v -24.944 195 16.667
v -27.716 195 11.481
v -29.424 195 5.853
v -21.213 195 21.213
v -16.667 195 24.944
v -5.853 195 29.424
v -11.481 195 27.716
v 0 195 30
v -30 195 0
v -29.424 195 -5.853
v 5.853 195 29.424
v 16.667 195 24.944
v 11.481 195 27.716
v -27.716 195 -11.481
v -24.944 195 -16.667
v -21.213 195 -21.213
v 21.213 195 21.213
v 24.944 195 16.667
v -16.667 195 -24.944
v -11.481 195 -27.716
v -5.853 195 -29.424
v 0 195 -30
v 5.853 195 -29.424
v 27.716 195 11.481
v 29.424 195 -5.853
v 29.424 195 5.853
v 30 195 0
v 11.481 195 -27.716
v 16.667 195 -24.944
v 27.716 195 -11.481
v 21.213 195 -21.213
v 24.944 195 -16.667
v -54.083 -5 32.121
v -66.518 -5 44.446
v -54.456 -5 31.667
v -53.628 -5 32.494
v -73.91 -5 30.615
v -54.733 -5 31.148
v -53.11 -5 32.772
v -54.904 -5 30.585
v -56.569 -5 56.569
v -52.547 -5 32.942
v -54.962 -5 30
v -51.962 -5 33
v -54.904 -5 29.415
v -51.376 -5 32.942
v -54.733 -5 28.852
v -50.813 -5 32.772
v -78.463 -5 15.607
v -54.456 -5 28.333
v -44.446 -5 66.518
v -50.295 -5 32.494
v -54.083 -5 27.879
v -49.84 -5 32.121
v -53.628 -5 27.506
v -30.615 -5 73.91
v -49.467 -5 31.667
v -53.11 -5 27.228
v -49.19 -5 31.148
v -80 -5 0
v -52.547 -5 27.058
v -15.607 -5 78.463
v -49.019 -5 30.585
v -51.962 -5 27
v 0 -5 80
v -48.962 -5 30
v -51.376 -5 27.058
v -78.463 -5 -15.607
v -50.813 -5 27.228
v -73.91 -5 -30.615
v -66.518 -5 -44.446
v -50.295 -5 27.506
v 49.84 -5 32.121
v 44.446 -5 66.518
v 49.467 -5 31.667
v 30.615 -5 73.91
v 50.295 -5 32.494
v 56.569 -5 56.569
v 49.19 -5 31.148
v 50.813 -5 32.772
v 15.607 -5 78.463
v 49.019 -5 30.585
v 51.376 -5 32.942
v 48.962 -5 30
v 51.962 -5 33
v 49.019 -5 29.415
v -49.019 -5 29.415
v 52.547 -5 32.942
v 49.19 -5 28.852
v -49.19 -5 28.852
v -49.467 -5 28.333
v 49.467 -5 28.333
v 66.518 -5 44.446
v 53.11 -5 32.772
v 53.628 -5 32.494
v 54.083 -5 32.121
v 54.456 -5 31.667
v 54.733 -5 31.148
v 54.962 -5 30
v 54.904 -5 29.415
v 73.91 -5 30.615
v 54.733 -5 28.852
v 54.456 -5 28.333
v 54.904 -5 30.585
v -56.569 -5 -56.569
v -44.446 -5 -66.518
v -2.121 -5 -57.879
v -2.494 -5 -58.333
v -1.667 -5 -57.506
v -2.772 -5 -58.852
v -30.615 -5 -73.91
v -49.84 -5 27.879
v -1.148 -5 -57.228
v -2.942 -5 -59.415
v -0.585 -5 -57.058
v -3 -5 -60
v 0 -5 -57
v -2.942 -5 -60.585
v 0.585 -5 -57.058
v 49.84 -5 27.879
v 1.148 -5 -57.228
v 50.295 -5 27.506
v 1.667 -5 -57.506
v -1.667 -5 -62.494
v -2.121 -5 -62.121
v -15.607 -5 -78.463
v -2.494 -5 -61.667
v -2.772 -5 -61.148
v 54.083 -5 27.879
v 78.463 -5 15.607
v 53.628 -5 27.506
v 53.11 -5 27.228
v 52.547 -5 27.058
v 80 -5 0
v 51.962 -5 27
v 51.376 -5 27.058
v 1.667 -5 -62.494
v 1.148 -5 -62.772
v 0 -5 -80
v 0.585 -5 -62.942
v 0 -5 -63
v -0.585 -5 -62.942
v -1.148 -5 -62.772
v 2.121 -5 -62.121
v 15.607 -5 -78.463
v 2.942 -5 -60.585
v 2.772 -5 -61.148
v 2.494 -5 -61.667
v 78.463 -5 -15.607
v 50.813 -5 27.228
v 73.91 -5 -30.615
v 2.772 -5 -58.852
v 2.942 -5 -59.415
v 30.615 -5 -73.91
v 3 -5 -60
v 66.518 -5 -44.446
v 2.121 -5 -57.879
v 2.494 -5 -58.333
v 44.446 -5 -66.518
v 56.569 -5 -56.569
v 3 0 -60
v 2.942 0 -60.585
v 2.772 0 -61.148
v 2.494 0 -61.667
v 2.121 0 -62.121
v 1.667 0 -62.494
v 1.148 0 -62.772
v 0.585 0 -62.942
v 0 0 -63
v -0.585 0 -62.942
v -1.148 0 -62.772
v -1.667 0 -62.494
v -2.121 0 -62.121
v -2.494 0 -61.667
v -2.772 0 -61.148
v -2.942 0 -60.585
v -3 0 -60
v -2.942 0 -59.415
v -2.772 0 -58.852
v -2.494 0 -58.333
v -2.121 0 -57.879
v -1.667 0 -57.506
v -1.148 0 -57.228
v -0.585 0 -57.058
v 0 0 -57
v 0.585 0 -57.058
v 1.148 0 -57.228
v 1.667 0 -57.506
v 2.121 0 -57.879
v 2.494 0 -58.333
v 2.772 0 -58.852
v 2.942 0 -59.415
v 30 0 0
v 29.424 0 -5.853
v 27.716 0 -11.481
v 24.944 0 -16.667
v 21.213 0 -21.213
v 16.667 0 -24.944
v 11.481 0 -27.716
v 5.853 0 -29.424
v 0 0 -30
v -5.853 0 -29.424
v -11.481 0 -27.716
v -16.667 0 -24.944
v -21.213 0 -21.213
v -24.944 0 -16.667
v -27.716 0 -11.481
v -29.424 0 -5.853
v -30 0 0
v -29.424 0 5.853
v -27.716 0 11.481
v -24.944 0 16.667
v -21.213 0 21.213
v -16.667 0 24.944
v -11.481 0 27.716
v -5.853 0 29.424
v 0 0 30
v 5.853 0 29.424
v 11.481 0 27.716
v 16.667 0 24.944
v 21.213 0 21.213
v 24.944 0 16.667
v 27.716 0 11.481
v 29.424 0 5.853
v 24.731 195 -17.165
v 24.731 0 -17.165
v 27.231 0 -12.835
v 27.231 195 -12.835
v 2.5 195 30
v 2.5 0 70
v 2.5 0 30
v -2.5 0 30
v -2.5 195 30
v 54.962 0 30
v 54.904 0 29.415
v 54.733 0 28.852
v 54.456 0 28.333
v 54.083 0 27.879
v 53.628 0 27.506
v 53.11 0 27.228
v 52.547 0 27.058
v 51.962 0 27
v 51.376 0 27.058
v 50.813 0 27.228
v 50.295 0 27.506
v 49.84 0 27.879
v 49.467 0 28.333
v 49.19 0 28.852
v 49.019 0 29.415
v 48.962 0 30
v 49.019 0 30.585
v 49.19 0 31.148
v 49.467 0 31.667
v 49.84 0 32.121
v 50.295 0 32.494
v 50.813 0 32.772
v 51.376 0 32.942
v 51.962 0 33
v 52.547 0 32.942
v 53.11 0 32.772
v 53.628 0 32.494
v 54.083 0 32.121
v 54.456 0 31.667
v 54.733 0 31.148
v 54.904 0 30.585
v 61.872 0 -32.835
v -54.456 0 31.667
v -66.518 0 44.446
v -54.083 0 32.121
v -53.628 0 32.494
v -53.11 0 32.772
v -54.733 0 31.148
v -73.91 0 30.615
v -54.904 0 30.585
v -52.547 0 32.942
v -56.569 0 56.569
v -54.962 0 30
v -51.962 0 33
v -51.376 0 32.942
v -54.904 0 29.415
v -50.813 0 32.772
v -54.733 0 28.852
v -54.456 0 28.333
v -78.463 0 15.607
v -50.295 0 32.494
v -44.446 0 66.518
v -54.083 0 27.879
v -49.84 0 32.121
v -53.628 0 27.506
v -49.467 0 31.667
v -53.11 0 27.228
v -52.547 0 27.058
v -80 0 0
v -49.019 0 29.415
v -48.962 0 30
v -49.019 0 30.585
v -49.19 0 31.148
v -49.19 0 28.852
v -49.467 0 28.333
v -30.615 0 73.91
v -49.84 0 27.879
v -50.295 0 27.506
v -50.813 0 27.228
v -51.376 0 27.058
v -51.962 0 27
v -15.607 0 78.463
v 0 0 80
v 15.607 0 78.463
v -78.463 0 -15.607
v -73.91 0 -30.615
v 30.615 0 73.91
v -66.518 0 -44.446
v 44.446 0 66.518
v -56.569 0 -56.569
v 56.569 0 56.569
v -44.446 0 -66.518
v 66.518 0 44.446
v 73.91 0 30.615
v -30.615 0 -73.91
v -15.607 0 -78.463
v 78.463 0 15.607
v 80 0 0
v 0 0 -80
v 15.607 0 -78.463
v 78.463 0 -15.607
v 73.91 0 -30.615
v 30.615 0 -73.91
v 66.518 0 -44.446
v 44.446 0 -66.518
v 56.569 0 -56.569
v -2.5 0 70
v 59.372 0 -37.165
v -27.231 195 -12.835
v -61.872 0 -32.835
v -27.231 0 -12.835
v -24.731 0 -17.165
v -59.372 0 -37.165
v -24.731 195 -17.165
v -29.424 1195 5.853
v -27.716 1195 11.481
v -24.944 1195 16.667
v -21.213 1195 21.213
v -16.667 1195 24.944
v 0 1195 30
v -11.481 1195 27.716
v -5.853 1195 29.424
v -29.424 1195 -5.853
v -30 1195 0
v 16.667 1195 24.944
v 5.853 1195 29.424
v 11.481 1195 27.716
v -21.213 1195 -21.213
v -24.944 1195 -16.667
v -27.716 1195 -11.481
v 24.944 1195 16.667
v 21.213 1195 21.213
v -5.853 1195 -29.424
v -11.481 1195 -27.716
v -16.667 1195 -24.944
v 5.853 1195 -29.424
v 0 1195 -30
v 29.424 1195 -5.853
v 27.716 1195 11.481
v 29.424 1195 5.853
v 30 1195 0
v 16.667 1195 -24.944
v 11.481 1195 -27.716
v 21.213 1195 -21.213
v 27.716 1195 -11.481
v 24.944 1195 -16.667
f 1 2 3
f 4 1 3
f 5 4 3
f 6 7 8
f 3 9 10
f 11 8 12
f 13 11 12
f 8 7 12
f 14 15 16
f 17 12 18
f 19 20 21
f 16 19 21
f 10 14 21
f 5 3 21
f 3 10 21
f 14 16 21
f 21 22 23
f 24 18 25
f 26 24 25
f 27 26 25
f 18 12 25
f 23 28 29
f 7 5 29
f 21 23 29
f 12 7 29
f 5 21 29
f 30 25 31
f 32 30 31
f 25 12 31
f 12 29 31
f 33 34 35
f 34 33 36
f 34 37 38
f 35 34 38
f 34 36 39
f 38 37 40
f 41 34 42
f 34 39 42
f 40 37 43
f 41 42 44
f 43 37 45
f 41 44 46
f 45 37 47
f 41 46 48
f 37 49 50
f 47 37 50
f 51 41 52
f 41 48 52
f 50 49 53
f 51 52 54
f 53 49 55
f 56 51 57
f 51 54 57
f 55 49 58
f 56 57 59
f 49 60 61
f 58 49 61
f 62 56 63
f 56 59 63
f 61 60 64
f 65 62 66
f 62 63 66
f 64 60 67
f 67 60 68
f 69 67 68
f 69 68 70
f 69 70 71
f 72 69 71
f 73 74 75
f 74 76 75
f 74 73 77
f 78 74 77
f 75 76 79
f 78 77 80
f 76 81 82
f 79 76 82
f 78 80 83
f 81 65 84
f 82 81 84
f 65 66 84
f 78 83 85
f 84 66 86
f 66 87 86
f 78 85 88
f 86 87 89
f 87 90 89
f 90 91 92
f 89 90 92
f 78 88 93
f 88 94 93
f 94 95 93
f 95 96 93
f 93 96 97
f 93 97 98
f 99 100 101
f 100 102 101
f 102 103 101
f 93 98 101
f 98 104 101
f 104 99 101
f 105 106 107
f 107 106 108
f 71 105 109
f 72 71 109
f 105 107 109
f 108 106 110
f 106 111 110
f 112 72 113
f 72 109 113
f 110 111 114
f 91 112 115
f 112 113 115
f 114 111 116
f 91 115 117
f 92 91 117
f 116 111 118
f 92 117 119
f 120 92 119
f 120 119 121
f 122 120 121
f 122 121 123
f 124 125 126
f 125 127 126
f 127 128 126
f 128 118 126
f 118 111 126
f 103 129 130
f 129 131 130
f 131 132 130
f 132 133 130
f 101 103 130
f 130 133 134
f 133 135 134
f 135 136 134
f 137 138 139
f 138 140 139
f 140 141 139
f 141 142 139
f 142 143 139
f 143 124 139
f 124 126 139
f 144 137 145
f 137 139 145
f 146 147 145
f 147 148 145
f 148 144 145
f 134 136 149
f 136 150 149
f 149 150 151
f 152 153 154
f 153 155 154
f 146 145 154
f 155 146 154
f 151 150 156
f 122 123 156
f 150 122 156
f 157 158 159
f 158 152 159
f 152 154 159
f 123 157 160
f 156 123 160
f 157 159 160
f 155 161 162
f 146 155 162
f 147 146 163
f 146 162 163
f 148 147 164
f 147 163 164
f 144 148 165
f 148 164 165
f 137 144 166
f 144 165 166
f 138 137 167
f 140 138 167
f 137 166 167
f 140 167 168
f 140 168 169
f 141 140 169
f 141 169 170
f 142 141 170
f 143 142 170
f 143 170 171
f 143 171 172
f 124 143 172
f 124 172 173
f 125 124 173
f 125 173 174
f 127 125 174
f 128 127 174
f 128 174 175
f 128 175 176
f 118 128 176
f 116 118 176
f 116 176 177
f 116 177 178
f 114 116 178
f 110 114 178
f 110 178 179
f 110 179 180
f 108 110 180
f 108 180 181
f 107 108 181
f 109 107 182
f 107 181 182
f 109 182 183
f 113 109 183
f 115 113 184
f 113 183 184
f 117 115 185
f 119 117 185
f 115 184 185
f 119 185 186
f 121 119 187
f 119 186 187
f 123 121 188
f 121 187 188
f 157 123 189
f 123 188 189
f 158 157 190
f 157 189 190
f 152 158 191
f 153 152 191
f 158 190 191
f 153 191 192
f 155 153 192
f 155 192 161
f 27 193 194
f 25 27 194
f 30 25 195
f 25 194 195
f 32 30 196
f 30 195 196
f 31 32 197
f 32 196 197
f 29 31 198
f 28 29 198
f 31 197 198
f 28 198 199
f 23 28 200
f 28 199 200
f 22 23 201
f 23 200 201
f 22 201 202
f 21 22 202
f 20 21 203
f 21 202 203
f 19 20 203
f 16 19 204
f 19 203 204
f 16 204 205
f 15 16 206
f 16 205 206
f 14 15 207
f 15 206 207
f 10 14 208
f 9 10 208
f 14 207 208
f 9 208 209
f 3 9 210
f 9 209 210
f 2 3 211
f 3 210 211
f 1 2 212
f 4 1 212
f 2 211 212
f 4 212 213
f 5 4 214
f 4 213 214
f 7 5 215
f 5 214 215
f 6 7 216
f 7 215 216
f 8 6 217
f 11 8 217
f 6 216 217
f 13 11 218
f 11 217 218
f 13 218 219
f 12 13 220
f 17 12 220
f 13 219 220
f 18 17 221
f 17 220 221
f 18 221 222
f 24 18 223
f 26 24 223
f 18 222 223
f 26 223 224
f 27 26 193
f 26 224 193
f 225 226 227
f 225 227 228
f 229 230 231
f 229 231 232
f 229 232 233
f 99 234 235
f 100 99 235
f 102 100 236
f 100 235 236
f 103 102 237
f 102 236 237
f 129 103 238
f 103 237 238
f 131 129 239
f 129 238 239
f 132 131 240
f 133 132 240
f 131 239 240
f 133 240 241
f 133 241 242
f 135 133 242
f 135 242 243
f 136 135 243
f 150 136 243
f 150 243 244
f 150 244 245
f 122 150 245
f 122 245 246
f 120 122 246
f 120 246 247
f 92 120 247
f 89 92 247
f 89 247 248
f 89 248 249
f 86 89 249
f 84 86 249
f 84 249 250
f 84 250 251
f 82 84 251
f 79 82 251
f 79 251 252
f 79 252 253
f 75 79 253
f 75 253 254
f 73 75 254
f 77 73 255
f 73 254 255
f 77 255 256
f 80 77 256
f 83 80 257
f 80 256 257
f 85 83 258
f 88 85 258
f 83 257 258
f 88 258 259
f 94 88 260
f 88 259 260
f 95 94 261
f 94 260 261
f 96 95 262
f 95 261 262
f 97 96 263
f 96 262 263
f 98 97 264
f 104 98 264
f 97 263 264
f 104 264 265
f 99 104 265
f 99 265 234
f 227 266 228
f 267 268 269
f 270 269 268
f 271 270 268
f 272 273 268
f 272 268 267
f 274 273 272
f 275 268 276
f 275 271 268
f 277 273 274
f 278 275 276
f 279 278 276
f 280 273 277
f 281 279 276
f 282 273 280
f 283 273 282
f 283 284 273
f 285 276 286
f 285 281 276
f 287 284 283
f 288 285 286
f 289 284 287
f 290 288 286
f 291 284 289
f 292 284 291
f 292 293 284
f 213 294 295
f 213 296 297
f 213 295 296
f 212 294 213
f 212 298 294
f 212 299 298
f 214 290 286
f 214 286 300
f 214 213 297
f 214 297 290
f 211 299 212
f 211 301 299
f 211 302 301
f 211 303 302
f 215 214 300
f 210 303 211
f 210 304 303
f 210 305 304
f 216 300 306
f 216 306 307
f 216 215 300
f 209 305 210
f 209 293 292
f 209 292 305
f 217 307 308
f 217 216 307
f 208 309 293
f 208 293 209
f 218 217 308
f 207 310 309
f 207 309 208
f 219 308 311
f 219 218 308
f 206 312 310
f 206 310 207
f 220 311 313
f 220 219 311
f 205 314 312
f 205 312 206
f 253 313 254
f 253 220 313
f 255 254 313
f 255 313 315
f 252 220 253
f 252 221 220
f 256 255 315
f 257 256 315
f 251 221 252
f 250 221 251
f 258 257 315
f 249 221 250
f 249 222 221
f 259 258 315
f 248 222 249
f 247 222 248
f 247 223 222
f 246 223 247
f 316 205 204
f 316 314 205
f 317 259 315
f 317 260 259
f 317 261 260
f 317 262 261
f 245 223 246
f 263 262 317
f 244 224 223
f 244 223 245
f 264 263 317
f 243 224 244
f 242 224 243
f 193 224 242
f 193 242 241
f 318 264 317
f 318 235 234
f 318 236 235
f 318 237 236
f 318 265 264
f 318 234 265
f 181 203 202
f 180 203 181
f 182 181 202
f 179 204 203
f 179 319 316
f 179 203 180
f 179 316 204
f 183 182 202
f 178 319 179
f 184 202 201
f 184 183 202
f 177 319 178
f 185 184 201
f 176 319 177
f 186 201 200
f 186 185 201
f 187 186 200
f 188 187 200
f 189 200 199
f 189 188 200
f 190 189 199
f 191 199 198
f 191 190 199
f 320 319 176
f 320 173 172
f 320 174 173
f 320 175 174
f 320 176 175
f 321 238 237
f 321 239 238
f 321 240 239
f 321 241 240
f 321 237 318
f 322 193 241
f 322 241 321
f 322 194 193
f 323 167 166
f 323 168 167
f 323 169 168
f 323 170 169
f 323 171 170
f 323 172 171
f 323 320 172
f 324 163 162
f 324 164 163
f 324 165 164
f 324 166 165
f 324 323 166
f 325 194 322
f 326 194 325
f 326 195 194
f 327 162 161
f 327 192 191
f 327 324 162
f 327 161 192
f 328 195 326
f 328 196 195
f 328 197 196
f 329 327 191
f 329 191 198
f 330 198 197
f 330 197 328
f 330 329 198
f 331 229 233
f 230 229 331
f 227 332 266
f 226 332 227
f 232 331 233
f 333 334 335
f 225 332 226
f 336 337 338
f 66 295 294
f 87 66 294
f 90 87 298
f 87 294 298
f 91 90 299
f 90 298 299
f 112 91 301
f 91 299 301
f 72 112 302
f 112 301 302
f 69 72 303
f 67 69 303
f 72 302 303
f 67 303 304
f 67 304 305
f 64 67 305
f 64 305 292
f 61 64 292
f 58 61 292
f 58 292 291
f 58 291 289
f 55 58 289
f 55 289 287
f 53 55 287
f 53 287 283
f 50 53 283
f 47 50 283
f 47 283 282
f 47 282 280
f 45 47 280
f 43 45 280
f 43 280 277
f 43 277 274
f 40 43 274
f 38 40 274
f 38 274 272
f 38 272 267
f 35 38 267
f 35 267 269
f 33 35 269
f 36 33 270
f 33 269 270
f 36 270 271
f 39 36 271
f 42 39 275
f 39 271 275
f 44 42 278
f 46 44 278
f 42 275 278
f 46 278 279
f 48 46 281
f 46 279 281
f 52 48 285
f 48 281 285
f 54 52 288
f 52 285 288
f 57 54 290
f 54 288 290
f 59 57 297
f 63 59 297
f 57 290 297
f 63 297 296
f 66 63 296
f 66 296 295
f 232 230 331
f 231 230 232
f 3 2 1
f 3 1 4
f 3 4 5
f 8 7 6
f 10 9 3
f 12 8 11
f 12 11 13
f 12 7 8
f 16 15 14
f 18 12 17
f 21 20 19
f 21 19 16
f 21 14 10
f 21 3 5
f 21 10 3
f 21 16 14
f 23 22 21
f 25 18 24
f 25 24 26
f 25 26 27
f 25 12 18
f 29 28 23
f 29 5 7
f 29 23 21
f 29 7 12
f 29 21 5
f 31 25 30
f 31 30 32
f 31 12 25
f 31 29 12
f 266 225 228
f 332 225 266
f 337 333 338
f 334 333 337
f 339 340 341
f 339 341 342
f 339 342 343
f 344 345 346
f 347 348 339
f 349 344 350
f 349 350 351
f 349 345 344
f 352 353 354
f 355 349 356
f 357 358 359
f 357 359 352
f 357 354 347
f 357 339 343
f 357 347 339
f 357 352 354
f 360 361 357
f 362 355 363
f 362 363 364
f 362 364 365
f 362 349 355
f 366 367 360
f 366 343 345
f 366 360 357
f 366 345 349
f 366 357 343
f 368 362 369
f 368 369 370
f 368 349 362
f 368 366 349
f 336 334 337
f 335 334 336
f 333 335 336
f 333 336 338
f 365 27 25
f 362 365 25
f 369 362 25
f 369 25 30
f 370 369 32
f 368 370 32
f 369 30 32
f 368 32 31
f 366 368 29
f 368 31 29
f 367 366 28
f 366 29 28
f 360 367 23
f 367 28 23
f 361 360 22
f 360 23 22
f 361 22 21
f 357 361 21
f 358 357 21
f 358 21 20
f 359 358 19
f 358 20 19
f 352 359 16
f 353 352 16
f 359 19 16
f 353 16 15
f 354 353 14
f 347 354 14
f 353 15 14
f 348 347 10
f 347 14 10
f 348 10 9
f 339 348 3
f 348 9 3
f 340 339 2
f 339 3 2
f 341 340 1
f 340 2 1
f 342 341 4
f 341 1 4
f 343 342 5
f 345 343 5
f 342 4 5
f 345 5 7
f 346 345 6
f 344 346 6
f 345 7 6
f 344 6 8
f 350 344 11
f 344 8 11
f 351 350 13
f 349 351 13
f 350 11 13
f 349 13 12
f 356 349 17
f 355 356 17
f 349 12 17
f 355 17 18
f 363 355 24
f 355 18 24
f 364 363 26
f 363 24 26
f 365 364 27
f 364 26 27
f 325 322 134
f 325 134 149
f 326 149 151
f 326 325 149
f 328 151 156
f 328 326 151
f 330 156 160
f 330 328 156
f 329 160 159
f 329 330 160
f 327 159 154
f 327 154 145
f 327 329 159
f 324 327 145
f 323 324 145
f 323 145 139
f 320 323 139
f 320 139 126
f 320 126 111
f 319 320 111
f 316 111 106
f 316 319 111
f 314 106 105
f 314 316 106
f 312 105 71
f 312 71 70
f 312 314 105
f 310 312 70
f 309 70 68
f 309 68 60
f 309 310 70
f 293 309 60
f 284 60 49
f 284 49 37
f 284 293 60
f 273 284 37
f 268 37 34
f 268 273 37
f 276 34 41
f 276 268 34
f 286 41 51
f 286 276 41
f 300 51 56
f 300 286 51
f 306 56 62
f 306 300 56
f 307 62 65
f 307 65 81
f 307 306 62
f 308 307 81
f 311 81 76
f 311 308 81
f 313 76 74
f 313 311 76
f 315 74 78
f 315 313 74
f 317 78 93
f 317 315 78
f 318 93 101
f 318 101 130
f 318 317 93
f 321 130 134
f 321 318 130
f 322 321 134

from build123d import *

# Parameters (mm, degrees)
SKETCH1_R                = 80
BOSS_EXTRUDE1_DEPTH      = 5
SKETCH2_R                = 30
BOSS_EXTRUDE2_DEPTH      = 195
BOSS_EXTRUDE3_DEPTH      = 2.5
BOSS_EXTRUDE3_DEPTH_BACK = 2.5
CIRPATTERN5_COUNT        = 3
SKETCH4_R                = 3
CUT_EXTRUDE1_DEPTH       = 226.444006352
SKETCH5_R                = 30
BOSS_EXTRUDE4_DEPTH      = 1000


with BuildPart() as part:
    # Sketch1 → Boss-Extrude1 (new body)
    with BuildSketch(Plane(origin=(0, 0, 0), x_dir=(1, 0, 0), z_dir=(0, 1, 0))):
        Circle(SKETCH1_R)
    extrude(amount=-BOSS_EXTRUDE1_DEPTH)

    # Sketch2 → Boss-Extrude2 (add)
    with BuildSketch(Plane(origin=(0, 0, 0), x_dir=(1, 0, 0), z_dir=(0, 1, 0))):
        Circle(SKETCH2_R)
    extrude(amount=BOSS_EXTRUDE2_DEPTH)

    # Sketch4 → Cut-Extrude1 (cut, through all)
    with BuildSketch(Plane(origin=(0, 0, 0), x_dir=(1, 0, 0), z_dir=(0, 1, 0))):
        with Locations((0, 60)):
            Circle(SKETCH4_R)
        with Locations((51.961524227, -30)):
            Circle(SKETCH4_R)
        with Locations((-51.961524227, -30)):
            Circle(SKETCH4_R)
    extrude(amount=-CUT_EXTRUDE1_DEPTH, mode=Mode.SUBTRACT)


with BuildPart() as body_2:
    # Sketch3 → Boss-Extrude3 (new, two sides: drawn at the far end of the back side and taken through both)
    with BuildSketch(Plane(origin=(0, 0, 0), x_dir=(0, 0, -1), z_dir=(1, 0, 0)).offset(-BOSS_EXTRUDE3_DEPTH_BACK)):
        Polygon((-70, 0), (-30, 0), (-30, 195), align=None)
    extrude(amount=BOSS_EXTRUDE3_DEPTH + BOSS_EXTRUDE3_DEPTH_BACK)


with BuildPart() as cirpattern5_1:
    # CirPattern5: pattern copy
    add(body_2.part.rotate(Axis((0, 195, 0), (0, -1, 0)), 1 * 360 / CIRPATTERN5_COUNT))


with BuildPart() as cirpattern5_2:
    # CirPattern5: pattern copy
    add(body_2.part.rotate(Axis((0, 195, 0), (0, -1, 0)), 2 * 360 / CIRPATTERN5_COUNT))


with BuildPart() as body_5:
    # Sketch5 → Boss-Extrude4 (new body)
    with BuildSketch(Plane(origin=(0, 195, 0), x_dir=(1, 0, 0), z_dir=(0, 1, 0))):
        Circle(SKETCH5_R)
    extrude(amount=BOSS_EXTRUDE4_DEPTH)


solid = Compound([part.part, body_2.part, cirpattern5_1.part, cirpattern5_2.part, body_5.part])
